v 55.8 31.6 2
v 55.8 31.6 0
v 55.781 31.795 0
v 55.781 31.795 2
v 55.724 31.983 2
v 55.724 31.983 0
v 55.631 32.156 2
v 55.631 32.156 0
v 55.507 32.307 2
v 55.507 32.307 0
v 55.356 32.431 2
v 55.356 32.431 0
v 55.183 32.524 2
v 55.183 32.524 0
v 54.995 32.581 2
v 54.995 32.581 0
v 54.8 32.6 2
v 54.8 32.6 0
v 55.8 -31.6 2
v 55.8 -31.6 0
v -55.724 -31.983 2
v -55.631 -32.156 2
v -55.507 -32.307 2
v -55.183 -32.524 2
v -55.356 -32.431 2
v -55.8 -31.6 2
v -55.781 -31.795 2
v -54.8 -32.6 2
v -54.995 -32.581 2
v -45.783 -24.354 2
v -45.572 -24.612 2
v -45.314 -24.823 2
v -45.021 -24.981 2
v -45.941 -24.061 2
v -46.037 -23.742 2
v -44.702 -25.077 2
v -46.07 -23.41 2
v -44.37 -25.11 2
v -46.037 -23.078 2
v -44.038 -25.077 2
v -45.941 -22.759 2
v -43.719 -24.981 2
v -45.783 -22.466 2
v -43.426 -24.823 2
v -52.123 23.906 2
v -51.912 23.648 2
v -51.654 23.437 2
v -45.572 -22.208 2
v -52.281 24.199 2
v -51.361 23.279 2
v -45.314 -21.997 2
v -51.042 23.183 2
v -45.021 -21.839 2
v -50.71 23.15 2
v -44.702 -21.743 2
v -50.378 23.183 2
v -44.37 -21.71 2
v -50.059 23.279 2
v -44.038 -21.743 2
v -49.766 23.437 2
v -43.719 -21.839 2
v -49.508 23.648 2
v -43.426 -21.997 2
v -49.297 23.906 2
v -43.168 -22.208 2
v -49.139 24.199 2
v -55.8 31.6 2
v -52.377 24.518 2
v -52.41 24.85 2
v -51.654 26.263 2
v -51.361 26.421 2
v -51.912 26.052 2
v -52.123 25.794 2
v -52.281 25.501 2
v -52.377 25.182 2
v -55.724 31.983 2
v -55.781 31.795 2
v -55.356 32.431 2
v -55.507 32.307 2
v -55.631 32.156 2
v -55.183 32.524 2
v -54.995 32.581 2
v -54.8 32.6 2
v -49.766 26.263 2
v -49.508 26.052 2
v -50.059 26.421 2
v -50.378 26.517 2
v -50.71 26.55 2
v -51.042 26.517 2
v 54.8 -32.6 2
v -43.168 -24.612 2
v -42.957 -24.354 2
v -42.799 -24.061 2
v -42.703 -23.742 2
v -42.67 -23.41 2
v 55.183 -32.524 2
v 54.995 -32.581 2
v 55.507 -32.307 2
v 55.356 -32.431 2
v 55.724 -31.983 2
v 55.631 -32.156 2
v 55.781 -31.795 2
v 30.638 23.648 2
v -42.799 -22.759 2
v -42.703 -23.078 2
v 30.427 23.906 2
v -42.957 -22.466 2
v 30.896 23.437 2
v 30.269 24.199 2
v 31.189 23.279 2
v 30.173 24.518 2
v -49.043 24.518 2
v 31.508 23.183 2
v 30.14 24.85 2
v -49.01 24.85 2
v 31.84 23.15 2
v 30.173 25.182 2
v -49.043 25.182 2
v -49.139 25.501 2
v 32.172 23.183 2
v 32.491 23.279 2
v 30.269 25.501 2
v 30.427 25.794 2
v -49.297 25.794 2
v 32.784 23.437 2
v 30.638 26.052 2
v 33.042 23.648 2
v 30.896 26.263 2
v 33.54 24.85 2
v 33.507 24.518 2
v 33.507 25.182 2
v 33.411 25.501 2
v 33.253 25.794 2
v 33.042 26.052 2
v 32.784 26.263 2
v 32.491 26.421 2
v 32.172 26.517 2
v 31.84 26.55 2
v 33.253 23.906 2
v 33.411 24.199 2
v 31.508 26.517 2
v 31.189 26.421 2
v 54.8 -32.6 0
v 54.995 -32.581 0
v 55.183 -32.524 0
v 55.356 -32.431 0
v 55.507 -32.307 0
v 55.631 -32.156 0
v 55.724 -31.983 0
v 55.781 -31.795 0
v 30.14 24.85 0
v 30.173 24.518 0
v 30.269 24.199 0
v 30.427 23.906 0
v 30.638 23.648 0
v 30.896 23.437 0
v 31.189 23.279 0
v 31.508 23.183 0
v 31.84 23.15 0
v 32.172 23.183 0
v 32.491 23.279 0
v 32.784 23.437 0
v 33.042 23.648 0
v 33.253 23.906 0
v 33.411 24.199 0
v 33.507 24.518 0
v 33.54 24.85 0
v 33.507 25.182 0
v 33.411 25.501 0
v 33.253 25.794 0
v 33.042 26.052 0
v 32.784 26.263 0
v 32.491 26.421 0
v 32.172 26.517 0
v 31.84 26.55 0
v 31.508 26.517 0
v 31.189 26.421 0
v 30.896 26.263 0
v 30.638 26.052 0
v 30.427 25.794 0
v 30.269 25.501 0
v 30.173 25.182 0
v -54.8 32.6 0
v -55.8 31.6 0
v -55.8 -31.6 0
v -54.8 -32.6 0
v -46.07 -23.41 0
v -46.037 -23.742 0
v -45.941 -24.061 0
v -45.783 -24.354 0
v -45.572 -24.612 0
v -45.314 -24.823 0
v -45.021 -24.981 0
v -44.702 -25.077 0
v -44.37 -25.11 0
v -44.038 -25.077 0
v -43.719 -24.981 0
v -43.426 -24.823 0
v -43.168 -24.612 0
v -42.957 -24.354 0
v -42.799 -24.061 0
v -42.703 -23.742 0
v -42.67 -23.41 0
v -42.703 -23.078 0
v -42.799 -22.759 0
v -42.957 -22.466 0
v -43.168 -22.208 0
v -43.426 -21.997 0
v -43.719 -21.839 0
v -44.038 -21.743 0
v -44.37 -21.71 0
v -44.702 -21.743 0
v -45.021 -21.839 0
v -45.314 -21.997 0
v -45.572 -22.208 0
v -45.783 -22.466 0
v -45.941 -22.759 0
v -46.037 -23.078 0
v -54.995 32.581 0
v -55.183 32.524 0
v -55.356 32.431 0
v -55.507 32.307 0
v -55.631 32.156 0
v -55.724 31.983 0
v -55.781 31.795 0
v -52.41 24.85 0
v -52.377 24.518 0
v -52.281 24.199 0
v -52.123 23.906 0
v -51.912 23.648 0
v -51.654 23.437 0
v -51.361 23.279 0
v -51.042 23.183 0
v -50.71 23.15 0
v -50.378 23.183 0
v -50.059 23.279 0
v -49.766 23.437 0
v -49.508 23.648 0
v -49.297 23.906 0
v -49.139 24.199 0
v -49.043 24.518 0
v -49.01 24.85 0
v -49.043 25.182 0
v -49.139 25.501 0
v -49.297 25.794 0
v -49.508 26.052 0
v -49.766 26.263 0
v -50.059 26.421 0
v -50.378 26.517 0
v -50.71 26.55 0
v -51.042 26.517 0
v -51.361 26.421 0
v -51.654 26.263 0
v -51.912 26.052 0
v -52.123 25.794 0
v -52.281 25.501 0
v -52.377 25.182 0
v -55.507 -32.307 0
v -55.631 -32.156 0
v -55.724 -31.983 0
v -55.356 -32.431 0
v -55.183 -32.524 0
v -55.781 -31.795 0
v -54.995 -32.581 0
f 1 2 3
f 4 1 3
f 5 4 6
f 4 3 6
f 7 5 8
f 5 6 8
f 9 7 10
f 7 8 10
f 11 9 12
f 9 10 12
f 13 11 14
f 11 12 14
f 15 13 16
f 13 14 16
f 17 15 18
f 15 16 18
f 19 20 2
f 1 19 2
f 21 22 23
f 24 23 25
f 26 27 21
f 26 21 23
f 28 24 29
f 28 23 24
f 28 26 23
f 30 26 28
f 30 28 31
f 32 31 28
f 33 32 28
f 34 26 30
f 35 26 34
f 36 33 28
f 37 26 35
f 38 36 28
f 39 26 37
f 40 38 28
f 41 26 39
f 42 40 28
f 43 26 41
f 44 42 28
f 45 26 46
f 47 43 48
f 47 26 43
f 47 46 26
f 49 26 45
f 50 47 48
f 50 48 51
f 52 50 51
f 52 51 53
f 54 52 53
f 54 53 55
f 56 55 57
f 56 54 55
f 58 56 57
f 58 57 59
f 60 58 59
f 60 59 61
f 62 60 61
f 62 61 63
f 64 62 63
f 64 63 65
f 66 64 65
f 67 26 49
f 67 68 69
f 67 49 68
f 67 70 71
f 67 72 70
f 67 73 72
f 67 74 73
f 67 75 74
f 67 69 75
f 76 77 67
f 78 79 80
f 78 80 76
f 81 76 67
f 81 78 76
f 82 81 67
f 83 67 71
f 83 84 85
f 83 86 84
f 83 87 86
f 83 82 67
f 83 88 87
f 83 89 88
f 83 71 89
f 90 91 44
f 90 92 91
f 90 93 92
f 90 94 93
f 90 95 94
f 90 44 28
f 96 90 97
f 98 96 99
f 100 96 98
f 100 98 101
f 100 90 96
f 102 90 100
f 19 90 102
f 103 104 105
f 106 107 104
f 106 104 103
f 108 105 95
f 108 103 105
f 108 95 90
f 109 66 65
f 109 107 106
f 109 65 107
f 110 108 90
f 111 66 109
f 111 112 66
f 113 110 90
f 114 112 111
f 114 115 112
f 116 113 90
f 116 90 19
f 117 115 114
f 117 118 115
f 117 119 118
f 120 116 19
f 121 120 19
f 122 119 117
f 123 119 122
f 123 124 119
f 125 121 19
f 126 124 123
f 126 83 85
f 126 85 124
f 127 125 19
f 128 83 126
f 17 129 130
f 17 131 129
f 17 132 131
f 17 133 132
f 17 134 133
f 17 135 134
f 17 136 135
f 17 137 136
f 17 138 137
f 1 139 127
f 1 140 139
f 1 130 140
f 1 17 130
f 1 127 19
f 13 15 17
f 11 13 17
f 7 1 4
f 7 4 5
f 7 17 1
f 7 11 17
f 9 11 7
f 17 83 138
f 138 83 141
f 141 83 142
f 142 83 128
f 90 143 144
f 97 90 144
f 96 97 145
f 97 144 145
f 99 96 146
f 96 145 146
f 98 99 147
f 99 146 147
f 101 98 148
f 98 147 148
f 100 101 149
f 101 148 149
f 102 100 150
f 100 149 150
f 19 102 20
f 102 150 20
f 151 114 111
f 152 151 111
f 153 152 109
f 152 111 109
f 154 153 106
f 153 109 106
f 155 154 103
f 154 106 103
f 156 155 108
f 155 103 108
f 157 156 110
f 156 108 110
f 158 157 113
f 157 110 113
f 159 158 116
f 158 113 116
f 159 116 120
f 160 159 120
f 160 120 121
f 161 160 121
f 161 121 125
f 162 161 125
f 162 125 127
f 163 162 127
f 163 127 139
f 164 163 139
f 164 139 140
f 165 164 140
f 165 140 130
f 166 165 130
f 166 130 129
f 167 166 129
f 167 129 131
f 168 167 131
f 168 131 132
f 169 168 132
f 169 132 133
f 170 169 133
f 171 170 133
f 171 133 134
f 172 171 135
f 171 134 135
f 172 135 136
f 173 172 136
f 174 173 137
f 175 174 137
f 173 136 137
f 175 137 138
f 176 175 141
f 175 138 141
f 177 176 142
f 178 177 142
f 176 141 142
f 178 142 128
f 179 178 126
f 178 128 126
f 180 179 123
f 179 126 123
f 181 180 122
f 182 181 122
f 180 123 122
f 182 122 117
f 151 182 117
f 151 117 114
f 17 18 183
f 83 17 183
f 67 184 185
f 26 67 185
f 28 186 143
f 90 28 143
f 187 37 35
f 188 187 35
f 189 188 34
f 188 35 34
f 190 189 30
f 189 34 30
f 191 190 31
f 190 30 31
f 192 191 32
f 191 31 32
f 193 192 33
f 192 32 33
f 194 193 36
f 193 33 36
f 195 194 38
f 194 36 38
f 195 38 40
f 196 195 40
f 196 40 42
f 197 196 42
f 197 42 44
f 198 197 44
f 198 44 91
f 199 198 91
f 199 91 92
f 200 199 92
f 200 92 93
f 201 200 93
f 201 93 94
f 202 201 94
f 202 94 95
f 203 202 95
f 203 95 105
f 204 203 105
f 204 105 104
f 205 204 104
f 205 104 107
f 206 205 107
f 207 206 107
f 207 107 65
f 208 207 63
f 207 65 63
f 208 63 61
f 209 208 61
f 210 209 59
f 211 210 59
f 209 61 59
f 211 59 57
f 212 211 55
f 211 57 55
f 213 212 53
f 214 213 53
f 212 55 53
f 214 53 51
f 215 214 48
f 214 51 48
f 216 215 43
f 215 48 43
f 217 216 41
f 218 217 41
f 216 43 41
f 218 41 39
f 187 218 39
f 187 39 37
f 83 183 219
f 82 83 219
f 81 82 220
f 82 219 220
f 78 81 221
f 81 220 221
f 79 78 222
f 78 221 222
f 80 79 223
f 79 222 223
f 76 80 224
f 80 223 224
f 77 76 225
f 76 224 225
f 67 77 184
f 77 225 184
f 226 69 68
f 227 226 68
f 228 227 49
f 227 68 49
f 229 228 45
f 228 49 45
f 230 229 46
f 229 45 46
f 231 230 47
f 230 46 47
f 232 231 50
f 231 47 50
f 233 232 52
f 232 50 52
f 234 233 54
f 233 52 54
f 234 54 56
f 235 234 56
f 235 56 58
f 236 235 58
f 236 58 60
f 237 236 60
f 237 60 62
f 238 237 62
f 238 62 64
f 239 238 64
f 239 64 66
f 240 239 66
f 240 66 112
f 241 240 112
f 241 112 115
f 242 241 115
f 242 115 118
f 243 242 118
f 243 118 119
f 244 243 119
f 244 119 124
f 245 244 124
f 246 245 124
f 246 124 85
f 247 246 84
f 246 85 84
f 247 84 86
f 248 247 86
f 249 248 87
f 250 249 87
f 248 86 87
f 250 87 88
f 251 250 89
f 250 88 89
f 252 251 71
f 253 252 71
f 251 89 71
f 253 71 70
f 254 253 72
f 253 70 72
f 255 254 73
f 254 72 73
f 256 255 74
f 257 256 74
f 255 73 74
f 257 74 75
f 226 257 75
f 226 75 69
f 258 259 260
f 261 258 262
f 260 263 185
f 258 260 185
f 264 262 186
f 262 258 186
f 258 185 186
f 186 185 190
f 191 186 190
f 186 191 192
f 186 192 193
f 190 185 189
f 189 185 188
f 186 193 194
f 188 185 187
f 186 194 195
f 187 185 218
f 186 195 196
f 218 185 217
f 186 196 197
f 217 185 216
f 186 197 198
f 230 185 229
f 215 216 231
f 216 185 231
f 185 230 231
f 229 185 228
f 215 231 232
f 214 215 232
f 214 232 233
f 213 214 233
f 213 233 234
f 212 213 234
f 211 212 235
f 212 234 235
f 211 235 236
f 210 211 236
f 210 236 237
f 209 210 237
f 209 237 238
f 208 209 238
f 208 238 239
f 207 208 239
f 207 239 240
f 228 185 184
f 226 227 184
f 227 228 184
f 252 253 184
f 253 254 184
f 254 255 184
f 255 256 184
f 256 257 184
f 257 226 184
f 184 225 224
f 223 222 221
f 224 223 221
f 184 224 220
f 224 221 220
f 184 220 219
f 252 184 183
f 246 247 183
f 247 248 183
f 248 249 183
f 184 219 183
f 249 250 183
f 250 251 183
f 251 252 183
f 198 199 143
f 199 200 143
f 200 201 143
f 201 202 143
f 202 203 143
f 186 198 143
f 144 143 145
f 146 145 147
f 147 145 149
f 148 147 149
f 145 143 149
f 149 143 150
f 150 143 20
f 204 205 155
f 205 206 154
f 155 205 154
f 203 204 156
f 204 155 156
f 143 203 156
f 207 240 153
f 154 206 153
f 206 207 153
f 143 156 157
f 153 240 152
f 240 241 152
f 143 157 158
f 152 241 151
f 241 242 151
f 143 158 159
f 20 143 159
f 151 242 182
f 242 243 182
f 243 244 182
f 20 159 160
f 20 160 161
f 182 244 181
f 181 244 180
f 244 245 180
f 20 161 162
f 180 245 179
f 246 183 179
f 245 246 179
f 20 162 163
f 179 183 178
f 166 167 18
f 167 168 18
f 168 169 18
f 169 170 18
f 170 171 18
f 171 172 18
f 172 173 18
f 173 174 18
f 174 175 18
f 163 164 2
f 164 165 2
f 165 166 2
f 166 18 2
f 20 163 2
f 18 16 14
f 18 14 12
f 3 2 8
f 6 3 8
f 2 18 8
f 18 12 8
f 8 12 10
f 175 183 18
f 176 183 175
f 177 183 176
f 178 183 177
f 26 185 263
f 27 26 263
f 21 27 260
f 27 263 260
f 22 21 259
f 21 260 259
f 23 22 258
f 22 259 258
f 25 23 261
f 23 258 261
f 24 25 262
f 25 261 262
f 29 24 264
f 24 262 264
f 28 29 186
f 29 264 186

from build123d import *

# Parameters (mm, degrees)
F1_DEPTH = 2
F2_D     = 3.4


with BuildPart() as f1:
    # F0 (on Top) → F1 (new body)
    with BuildSketch(Plane.XY):
        with BuildLine():
            Line((-54.8, -32.6), (54.8, -32.6))
            ThreePointArc((54.8, -32.6), (55.5071067812, -32.3071067812), (55.8, -31.6))
            Line((55.8, -31.6), (55.8, 31.6))
            ThreePointArc((55.8, 31.6), (55.5071067812, 32.3071067812), (54.8, 32.6))
            Line((54.8, 32.6), (-54.8, 32.6))
            ThreePointArc((-54.8, 32.6), (-55.5071067812, 32.3071067812), (-55.8, 31.6))
            Line((-55.8, 31.6), (-55.8, -31.6))
            ThreePointArc((-55.8, -31.6), (-55.5071067812, -32.3071067812), (-54.8, -32.6))
        make_face()
    extrude(amount=F1_DEPTH)

    # F2 (through all)
    with Locations(Plane(origin=(0, 0, 0), x_dir=(1, 0, 0), z_dir=(0, 0, -1))):
        with Locations((-50.71, -24.85), (-44.37, 23.41), (31.84, -24.85)):
            Hole(F2_D / 2)


solid = f1.part
